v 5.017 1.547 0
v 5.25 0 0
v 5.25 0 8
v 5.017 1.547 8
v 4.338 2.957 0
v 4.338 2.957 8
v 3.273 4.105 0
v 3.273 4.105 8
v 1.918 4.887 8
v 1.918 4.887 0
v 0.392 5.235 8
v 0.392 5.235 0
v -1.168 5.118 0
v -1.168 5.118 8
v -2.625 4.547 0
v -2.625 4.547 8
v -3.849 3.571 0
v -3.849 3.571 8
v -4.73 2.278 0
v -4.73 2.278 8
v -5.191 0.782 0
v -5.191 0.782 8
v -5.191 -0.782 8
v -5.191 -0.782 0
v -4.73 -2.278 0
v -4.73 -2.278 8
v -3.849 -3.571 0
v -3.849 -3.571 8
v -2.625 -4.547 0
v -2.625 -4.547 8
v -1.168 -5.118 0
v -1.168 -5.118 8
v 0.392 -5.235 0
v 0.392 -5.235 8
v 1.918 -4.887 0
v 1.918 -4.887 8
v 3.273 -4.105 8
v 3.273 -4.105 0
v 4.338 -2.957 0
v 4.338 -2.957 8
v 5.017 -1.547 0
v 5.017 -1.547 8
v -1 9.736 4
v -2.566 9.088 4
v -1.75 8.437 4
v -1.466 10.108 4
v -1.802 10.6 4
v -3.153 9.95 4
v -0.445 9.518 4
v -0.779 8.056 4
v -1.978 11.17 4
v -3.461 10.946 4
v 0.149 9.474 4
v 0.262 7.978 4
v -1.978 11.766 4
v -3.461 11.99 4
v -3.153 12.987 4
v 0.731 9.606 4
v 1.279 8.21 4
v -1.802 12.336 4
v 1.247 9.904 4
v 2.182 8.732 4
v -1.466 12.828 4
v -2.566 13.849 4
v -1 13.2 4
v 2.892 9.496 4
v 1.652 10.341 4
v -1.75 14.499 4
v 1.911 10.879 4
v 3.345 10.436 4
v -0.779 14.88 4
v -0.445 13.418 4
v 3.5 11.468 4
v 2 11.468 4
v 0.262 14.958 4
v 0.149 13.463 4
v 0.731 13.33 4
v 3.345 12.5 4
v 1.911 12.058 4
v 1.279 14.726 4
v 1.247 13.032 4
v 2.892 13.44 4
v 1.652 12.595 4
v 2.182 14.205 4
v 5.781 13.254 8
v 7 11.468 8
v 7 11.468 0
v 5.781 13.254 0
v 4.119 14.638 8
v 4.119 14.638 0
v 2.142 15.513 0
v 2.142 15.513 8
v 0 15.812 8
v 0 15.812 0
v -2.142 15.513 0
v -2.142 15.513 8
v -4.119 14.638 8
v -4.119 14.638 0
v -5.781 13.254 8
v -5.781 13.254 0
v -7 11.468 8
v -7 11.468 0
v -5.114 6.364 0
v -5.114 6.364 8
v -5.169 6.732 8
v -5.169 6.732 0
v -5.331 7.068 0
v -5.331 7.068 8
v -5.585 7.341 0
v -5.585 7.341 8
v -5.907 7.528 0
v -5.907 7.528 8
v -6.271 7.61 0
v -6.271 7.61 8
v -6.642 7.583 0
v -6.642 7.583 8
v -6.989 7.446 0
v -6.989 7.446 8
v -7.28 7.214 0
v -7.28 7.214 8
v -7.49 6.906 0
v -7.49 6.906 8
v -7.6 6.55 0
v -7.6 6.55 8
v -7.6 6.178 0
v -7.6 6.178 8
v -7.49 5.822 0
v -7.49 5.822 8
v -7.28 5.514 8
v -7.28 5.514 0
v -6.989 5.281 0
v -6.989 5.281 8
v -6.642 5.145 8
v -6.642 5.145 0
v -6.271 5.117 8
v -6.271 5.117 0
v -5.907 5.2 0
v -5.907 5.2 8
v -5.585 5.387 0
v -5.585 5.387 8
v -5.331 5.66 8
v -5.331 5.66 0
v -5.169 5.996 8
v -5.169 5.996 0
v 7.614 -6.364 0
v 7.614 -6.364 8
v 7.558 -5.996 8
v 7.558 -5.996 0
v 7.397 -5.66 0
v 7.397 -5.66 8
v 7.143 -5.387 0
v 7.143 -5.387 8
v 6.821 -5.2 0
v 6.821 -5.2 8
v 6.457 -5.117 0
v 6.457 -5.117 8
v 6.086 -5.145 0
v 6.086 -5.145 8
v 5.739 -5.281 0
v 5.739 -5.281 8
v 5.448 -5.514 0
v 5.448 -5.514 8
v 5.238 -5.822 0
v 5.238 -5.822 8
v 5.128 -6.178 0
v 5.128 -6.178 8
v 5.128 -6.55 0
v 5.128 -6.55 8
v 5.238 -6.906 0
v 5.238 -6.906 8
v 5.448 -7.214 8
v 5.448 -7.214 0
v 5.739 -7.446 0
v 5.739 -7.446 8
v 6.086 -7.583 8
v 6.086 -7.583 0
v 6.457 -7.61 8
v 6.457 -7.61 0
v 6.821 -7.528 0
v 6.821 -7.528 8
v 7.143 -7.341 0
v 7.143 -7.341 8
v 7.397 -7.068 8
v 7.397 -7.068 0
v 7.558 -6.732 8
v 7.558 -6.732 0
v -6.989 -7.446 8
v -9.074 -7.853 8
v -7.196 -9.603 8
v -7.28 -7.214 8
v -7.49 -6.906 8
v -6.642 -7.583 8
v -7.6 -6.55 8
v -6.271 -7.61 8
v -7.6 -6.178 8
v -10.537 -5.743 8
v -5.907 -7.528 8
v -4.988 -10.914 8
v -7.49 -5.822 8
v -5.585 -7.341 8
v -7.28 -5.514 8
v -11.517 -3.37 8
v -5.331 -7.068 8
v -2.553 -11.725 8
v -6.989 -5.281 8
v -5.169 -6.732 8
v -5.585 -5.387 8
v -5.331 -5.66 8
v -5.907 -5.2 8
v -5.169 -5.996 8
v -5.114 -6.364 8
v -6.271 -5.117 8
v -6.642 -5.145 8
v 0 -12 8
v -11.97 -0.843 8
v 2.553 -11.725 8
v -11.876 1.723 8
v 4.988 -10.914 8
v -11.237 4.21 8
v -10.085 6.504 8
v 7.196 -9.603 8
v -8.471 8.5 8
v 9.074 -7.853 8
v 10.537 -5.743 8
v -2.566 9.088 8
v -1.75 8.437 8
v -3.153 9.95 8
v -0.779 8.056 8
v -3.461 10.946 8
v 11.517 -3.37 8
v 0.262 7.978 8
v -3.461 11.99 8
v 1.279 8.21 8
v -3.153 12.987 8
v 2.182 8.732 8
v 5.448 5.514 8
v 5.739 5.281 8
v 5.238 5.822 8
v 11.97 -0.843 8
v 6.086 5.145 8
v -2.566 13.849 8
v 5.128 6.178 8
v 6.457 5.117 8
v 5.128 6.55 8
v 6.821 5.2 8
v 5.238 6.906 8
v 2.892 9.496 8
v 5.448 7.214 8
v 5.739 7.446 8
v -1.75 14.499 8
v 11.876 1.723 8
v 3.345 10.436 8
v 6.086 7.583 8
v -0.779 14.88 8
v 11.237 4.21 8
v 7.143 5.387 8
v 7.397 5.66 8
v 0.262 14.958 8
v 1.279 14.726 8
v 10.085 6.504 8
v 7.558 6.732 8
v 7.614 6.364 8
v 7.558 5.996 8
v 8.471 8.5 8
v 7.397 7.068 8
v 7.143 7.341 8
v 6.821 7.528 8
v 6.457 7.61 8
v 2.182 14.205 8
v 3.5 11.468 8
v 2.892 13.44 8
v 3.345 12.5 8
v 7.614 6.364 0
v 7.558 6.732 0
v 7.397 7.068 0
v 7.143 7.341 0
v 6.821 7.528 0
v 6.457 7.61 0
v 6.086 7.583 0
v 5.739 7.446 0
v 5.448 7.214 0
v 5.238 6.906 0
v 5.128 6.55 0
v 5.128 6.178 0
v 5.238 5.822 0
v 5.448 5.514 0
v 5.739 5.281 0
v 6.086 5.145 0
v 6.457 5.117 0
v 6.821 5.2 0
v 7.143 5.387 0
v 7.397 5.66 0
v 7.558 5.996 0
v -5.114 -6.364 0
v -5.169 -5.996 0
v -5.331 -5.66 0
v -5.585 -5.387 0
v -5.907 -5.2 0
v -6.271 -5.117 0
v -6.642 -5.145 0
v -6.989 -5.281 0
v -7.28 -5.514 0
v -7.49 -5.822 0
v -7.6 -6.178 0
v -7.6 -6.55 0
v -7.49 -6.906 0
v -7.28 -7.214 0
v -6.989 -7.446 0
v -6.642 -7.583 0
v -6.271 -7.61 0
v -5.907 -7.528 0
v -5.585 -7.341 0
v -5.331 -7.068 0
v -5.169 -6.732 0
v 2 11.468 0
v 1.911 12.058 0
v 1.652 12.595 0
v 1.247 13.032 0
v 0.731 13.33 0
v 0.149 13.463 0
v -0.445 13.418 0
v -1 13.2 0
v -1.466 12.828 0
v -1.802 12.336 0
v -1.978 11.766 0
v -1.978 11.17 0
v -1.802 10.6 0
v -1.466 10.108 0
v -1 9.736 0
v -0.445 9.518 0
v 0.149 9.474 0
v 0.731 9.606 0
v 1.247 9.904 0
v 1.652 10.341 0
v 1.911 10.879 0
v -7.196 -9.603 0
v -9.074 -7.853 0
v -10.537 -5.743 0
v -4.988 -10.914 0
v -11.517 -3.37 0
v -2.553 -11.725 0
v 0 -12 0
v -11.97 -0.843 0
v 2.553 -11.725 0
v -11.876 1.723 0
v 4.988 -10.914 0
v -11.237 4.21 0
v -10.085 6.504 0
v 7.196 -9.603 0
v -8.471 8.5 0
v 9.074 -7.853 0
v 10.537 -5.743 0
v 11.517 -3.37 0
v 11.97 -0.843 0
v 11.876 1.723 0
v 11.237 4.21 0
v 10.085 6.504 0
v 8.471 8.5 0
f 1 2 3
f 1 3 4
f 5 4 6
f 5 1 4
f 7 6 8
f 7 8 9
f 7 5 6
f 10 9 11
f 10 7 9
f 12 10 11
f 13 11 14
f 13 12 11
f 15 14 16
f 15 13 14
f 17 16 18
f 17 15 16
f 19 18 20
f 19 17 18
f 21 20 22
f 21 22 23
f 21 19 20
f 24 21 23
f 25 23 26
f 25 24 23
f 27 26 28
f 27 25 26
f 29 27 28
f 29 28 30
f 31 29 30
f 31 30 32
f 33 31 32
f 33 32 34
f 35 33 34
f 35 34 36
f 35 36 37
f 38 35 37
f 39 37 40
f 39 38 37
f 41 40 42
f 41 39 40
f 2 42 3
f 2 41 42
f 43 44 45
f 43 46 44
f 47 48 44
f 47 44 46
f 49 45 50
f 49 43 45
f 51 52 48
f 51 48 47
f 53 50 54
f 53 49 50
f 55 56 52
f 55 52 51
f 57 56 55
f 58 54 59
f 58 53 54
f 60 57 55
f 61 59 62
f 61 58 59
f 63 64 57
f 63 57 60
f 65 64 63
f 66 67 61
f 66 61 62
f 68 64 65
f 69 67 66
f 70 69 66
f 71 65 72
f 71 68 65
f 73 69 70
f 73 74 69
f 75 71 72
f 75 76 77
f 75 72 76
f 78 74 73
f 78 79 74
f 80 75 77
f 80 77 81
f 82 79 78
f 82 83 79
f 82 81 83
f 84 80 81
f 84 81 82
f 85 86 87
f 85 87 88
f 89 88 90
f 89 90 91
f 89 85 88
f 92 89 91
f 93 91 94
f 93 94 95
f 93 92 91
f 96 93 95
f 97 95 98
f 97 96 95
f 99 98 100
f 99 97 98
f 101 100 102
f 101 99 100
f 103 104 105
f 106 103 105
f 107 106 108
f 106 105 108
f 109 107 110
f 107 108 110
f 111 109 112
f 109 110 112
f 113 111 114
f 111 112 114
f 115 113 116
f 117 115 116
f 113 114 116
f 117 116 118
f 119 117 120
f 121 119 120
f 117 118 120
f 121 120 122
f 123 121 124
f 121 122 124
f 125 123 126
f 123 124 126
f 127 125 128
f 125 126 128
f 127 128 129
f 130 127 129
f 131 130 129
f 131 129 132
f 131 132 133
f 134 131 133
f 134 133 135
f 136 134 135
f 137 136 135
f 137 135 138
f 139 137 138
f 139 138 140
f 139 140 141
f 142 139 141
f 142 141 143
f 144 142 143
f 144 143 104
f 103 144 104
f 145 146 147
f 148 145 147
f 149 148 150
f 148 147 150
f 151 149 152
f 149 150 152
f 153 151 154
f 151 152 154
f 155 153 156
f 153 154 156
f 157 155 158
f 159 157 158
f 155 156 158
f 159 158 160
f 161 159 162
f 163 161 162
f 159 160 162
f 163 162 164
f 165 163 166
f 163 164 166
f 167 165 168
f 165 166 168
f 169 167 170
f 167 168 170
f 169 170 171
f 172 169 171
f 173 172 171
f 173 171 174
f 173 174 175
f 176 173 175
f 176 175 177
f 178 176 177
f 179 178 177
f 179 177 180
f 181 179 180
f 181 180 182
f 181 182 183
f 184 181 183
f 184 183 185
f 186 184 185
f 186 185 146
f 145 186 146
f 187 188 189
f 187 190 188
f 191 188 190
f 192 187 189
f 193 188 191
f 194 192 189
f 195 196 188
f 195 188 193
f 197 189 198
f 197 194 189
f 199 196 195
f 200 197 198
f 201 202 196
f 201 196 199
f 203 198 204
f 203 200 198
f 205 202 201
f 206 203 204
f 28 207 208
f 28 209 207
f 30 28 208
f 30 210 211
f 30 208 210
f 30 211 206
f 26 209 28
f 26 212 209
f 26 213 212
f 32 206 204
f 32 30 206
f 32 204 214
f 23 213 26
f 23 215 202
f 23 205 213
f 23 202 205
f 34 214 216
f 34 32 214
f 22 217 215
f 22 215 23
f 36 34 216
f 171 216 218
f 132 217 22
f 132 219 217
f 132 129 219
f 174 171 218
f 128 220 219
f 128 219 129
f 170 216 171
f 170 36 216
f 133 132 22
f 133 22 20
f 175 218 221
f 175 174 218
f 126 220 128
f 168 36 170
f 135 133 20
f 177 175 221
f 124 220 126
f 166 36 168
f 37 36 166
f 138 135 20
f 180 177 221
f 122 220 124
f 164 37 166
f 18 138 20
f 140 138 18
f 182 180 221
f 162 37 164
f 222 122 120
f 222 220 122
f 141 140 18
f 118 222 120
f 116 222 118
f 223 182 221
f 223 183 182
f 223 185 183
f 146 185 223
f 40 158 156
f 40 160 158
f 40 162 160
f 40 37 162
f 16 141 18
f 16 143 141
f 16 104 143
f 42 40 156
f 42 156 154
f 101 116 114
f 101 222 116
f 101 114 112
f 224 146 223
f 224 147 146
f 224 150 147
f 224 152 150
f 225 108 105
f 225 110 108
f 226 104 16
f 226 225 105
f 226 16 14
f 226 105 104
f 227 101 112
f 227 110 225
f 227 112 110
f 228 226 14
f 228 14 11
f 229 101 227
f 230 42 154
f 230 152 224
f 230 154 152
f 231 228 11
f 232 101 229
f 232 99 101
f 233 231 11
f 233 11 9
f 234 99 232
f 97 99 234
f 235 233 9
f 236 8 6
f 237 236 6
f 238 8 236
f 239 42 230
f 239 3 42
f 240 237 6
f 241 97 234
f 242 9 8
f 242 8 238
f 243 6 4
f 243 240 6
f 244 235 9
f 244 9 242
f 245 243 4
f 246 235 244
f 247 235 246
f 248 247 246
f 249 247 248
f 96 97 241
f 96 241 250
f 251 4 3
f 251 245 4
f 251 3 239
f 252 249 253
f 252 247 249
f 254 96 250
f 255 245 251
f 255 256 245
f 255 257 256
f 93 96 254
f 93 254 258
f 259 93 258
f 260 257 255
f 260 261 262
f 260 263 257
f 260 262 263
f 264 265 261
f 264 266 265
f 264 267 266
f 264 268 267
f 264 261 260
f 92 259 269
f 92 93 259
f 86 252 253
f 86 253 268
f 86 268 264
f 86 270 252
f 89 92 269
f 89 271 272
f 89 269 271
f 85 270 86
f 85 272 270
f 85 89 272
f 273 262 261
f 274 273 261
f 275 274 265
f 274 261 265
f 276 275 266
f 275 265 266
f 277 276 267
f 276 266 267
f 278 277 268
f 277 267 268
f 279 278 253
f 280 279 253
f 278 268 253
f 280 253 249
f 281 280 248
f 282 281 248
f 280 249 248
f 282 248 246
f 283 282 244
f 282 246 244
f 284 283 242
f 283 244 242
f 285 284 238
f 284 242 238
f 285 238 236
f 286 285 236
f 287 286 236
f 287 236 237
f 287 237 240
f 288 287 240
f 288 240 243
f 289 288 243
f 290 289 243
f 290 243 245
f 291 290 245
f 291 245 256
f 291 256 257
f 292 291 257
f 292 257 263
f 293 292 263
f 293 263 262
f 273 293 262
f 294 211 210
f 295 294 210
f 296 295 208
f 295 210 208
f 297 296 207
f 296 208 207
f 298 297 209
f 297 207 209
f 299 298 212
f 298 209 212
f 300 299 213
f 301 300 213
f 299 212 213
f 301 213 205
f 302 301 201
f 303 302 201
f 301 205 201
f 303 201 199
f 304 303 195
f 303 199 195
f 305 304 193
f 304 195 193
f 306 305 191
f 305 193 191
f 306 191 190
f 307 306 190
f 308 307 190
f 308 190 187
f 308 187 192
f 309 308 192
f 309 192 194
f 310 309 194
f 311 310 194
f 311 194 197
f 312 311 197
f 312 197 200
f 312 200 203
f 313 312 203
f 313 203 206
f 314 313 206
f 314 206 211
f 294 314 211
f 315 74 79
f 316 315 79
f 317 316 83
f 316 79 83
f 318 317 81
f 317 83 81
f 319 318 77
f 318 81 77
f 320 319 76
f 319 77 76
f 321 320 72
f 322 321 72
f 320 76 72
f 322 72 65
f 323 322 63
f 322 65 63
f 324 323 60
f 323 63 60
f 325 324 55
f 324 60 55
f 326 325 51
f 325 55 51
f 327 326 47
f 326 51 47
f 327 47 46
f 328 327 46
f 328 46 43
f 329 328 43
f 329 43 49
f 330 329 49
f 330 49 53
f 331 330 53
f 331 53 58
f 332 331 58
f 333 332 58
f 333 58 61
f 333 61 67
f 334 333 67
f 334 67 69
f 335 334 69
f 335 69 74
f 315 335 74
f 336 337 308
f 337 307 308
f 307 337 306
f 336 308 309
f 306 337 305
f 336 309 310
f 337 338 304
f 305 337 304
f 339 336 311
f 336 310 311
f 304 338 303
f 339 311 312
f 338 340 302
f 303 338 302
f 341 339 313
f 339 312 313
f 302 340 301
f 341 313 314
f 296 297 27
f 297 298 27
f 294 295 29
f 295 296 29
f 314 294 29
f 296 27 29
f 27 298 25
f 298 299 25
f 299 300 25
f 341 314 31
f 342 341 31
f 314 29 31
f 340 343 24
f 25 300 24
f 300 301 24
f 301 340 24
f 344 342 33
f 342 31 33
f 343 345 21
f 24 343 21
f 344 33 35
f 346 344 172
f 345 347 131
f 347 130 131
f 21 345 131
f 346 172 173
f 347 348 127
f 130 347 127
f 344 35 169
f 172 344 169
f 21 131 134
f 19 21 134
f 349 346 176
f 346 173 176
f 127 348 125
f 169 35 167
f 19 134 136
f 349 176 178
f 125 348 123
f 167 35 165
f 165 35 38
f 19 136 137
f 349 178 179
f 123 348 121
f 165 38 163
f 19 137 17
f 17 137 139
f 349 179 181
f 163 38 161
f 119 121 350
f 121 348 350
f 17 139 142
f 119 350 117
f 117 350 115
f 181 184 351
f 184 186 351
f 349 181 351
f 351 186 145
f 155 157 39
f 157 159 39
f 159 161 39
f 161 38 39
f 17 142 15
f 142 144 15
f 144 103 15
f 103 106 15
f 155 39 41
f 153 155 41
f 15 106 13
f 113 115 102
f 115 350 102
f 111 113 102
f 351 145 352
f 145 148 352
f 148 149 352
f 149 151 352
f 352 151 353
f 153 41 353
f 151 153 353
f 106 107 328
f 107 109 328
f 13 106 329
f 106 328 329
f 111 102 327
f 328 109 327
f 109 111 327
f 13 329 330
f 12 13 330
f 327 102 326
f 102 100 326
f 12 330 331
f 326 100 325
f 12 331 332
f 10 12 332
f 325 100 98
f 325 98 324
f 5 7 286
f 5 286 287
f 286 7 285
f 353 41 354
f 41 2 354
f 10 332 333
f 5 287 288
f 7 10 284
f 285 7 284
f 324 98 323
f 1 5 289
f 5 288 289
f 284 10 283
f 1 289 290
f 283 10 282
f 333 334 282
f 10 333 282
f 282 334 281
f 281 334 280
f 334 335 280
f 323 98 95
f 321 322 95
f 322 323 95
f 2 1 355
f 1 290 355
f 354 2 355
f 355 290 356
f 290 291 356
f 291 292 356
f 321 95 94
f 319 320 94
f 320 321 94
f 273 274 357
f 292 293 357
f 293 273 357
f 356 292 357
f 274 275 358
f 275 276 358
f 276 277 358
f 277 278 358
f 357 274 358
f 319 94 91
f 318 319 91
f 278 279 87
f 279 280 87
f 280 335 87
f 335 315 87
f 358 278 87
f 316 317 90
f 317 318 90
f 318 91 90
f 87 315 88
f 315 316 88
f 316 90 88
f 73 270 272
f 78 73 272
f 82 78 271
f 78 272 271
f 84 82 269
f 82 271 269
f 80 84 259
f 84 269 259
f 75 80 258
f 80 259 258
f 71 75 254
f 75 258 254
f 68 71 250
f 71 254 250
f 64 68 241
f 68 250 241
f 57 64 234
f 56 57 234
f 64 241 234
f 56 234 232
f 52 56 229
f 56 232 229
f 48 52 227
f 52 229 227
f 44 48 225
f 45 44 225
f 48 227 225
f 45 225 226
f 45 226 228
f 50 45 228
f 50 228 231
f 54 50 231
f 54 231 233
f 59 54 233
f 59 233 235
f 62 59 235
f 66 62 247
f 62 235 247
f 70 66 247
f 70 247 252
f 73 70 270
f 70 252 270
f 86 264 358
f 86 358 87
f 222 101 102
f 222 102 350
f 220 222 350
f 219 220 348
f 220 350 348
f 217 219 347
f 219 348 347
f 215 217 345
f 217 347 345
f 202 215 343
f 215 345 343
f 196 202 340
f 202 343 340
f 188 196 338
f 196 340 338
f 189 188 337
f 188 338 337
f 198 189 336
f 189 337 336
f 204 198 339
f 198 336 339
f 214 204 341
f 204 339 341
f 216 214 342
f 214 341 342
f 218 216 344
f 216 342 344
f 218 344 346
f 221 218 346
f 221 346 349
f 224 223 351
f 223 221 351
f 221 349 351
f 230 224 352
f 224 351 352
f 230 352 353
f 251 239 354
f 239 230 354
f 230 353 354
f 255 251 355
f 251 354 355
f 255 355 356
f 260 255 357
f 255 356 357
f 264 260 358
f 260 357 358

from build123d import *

# Parameters (mm, degrees)
ESQUISSE1_R             = 12
ESQUISSE1_R_2           = 5.25
BOSS_EXTRU_1_DEPTH      = 8
BOSS_EXTRU_2_DEPTH      = 8
ESQUISSE3_R             = 1.25
ENL_V_MAT_EXTRU_1_DEPTH = 22.401408884
ESQUISSE4_R             = 2
ENL_V_MAT_EXTRU_2_DEPTH = 22.401408884
ESQUISSE5_R             = 3.5
ENL_V_MAT_EXTRU_3_DEPTH = 4


with BuildPart() as part:
    # Esquisse1 → Boss.-Extru.1 (new body)
    with BuildSketch(Plane.XY):
        Circle(ESQUISSE1_R)
        Circle(ESQUISSE1_R_2, mode=Mode.SUBTRACT)
    extrude(amount=BOSS_EXTRU_1_DEPTH)

    # Esquisse2 → Boss.-Extru.2 (add)
    with BuildSketch(Plane.XY.offset(8)):
        with BuildLine():
            Line((-7, 11.468114388), (-8.470537173, 8.5))
            Line((-8.470537173, 8.5), (0, 8.5))
            Line((0, 8.5), (8.470537173, 8.5))
            Line((8.470537173, 8.5), (7, 11.468114388))
            ThreePointArc((7, 11.468114388), (0, 15.8120303), (-7, 11.468114388))
        make_face()
    extrude(amount=-BOSS_EXTRU_2_DEPTH)

    # Esquisse3 → Enlèv. mat.-Extru.1 (cut, through all)
    with BuildSketch(Plane.XY.offset(8)):
        with Locations((-6.363961031, 6.363961031)):
            Circle(ESQUISSE3_R)
        with Locations((6.363961031, 6.363961031)):
            Circle(ESQUISSE3_R)
        with Locations((6.363961031, -6.363961031)):
            Circle(ESQUISSE3_R)
        with Locations((-6.363961031, -6.363961031)):
            Circle(ESQUISSE3_R)
    extrude(amount=-ENL_V_MAT_EXTRU_1_DEPTH, mode=Mode.SUBTRACT)

    # Esquisse4 → Enlèv. mat.-Extru.2 (cut, through all)
    with BuildSketch(Plane.XY.offset(8)):
        with Locations((0, 11.468114388)):
            Circle(ESQUISSE4_R)
    extrude(amount=-ENL_V_MAT_EXTRU_2_DEPTH, mode=Mode.SUBTRACT)

    # Esquisse5 → Enlèv. mat.-Extru.3 (cut)
    with BuildSketch(Plane.XY.offset(8)):
        with Locations((0, 11.468114388)):
            Circle(ESQUISSE5_R)
    extrude(amount=-ENL_V_MAT_EXTRU_3_DEPTH, mode=Mode.SUBTRACT)


solid = part.part
